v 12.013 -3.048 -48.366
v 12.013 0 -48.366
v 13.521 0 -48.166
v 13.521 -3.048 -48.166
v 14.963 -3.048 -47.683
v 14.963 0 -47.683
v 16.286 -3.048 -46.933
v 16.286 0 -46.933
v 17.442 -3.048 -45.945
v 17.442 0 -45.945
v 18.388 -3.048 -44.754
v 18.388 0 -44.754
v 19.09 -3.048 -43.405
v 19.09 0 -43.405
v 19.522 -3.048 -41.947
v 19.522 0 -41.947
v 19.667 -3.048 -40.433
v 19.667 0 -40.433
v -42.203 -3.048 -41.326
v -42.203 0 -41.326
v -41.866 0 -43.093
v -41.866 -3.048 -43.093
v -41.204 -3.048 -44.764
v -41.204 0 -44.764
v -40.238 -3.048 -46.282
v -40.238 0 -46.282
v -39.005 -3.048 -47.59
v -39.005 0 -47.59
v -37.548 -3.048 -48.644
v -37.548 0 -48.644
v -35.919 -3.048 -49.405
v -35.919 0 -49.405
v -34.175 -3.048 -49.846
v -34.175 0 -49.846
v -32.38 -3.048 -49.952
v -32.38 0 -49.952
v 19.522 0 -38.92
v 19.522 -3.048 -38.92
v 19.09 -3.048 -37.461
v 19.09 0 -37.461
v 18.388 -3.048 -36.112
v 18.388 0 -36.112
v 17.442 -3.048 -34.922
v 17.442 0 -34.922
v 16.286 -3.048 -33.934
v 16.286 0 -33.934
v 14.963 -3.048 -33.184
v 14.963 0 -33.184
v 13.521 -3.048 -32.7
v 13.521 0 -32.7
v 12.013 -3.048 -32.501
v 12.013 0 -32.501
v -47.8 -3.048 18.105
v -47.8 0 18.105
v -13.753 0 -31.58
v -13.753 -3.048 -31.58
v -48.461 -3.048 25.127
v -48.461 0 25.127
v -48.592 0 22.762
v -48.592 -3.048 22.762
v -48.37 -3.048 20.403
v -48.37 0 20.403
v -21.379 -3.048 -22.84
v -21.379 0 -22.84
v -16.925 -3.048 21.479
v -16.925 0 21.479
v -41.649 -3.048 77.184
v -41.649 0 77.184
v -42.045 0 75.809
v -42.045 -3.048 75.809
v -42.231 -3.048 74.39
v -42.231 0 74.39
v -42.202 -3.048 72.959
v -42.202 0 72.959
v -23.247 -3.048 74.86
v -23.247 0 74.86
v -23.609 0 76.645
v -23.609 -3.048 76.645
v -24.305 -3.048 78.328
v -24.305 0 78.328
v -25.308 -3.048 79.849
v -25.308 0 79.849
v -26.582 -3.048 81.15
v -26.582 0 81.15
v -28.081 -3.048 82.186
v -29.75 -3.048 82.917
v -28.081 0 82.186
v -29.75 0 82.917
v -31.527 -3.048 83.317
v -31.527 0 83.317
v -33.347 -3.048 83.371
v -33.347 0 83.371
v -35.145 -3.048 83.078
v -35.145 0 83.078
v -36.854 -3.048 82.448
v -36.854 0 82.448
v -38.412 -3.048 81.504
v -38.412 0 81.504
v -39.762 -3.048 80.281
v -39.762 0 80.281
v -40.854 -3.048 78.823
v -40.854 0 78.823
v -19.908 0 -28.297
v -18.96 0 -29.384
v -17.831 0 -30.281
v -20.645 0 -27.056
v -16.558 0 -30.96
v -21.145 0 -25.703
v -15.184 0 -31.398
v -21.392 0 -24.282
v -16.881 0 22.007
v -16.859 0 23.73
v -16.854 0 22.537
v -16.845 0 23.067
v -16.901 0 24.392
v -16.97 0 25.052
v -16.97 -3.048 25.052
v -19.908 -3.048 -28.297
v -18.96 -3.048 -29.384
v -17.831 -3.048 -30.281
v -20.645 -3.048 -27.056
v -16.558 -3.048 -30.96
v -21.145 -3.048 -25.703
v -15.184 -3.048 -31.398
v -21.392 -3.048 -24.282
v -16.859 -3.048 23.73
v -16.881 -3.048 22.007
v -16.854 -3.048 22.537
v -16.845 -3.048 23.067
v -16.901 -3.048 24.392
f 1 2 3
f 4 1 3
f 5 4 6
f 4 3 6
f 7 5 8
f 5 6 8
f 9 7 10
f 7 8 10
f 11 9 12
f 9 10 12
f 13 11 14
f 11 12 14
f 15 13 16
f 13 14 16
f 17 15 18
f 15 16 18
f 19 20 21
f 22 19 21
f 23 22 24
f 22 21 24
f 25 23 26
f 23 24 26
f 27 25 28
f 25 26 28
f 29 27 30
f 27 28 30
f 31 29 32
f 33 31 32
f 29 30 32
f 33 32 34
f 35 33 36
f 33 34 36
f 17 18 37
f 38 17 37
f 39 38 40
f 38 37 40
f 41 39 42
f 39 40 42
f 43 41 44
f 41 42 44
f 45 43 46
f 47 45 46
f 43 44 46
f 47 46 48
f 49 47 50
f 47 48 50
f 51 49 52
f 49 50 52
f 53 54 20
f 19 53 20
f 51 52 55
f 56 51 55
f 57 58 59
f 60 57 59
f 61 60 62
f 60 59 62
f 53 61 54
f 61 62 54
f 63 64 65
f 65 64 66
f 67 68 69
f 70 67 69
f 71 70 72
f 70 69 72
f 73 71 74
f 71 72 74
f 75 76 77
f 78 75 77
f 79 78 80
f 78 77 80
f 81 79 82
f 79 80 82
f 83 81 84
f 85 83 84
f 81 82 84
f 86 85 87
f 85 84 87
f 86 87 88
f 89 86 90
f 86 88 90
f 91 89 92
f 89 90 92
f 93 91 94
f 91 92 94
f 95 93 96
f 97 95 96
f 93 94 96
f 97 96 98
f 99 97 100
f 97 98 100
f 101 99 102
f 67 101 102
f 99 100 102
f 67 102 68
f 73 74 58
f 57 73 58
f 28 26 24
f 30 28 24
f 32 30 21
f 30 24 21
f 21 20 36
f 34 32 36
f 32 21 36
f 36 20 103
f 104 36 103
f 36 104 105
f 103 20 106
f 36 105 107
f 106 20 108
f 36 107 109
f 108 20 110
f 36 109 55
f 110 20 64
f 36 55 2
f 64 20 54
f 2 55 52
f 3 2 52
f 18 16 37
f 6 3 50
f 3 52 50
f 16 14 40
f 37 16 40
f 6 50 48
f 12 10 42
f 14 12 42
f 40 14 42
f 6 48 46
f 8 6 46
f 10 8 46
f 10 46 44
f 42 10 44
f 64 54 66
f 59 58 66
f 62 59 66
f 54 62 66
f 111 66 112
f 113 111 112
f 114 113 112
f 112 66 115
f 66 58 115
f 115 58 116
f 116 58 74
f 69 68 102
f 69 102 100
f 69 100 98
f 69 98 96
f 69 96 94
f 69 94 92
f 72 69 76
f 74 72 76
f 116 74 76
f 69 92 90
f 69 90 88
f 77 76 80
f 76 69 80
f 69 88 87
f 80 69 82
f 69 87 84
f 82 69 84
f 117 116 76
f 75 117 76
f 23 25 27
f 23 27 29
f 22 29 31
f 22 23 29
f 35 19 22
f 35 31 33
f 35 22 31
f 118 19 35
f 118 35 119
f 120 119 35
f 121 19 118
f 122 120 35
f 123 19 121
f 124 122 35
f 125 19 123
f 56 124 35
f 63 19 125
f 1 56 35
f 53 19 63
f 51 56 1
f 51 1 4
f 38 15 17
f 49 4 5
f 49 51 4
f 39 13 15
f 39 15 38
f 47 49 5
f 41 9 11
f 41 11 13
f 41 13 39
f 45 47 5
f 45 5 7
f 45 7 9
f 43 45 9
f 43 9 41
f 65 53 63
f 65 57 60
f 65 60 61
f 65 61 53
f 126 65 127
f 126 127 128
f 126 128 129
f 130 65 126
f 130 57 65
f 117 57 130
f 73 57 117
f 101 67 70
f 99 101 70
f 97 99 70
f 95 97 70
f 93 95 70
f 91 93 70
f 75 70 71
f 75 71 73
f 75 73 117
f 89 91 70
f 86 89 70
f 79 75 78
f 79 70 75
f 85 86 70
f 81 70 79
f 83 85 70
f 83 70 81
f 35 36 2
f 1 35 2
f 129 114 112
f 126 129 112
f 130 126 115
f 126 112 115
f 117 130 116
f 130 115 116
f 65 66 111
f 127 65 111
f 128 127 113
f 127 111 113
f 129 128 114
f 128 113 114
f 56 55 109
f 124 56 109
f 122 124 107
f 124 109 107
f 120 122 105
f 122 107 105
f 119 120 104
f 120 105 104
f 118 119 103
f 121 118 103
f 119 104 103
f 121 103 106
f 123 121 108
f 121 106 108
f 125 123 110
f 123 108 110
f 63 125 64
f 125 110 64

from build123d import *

# Parameters (mm, degrees)
F0_R     = 3.175
F1_DEPTH = 3.048


with BuildPart() as f1:
    # F0 (on Front) → F1 (new body)
    with BuildSketch(Plane.XZ):
        with BuildLine():
            ThreePointArc((-16.9247666998, 21.4792444312), (-22.070918521, 11.293529333), (-32.7201922638, 7.1917444312))
            Line((-32.7201922638, 7.1917444312), (-32.7201922638, -30.9082555688))
            ThreePointArc((-32.7201922638, -30.9082555688), (-25.985000173, -33.698063478), (-23.1951922638, -40.4332555688))
            Line((-23.1951922638, -40.4332555688), (3.7923077362, -40.4332555688))
            ThreePointArc((3.7923077362, -40.4332555688), (6.2182849547, -34.7212486641), (12.013289879, -32.5008193651))
            Line((12.013289879, -32.5008193651), (-13.7525922633, -31.5800218579))
            ThreePointArc((-13.7525922633, -31.5800218579), (-19.4589923665, -28.8618964189), (-21.3790056715, -22.8398737564))
            Line((-21.3790056715, -22.8398737564), (-16.9247666998, 21.4792444312))
        make_face()
        with BuildLine():
            ThreePointArc((-32.7201922638, 7.1917444312), (-42.0272444513, 10.2061688384), (-47.7997573919, 18.1046540905))
            Line((-47.7997573919, 18.1046540905), (-42.2032386499, -41.326259622))
            ThreePointArc((-42.2032386499, -41.326259622), (-39.7640366902, -34.0215568316), (-32.7201922638, -30.9082555688))
            Line((-32.7201922638, -30.9082555688), (-32.7201922638, 7.1917444312))
        make_face()
        with BuildLine():
            ThreePointArc((-23.1951922638, 73.8667444312), (-25.985000173, 67.1315523404), (-32.7201922638, 64.3417444312))
            Line((-32.7201922638, 64.3417444312), (-32.7201922638, 59.5919444312))
            Line((-32.7201922638, 59.5919444312), (-32.7201922638, 38.9417444312))
            ThreePointArc((-32.7201922638, 38.9417444312), (-22.2201134041, 34.9732119568), (-16.9697862216, 25.051772014))
            Line((-16.9697862216, 25.051772014), (-23.2470820733, 74.8596232349))
            ThreePointArc((-23.2470820733, 74.8596232349), (-23.2081735621, 74.3638613368), (-23.1951922638, 73.8667444312))
        make_face()
        with BuildLine():
            ThreePointArc((-16.9697862216, 25.051772014), (-22.2201134041, 34.9732119568), (-32.7201922638, 38.9417444312))
            Line((-32.7201922638, 38.9417444312), (-32.7201922638, 26.2417444312))
            ThreePointArc((-32.7201922638, 26.2417444312), (-30.4751282336, 25.3118084615), (-29.5451922638, 23.0667444312))
            ThreePointArc((-29.5451922638, 23.0667444312), (-30.4751282336, 20.821680401), (-32.7201922638, 19.8917444312))
            Line((-32.7201922638, 19.8917444312), (-32.7201922638, 7.1917444312))
            ThreePointArc((-32.7201922638, 7.1917444312), (-22.070918521, 11.293529333), (-16.9247666998, 21.4792444312))
            ThreePointArc((-16.9247666998, 21.4792444312), (-16.8650983532, 22.2719978772), (-16.8451922638, 23.0667444312))
            ThreePointArc((-16.8451922638, 23.0667444312), (-16.8763713718, 24.0612113938), (-16.9697862216, 25.051772014))
        make_face()
        with BuildLine():
            Line((-32.7201922638, 26.2417444312), (-32.7201922638, 38.9417444312))
            ThreePointArc((-32.7201922638, 38.9417444312), (-43.1919774337, 34.9981039664), (-48.4609965266, 25.1265274684))
            Line((-48.4609965266, 25.1265274684), (-47.7997573919, 18.1046540905))
            ThreePointArc((-47.7997573919, 18.1046540905), (-42.0272444513, 10.2061688384), (-32.7201922638, 7.1917444312))
            Line((-32.7201922638, 7.1917444312), (-32.7201922638, 19.8917444312))
            ThreePointArc((-32.7201922638, 19.8917444312), (-35.8951922638, 23.0667444312), (-32.7201922638, 26.2417444312))
        make_face()
        with BuildLine():
            Line((-32.7201922638, 59.5919444312), (-32.7201922638, 64.3417444312))
            ThreePointArc((-32.7201922638, 64.3417444312), (-39.1263785452, 66.8178862025), (-42.2018298248, 72.9589040472))
            Line((-42.2018298248, 72.9589040472), (-48.4609965266, 25.1265274684))
            ThreePointArc((-48.4609965266, 25.1265274684), (-43.1919774337, 34.9981039664), (-32.7201922638, 38.9417444312))
            Line((-32.7201922638, 38.9417444312), (-32.7201922638, 59.5919444312))
        make_face()
        with Locations((-35.8951922638, 59.5919444312)):
            Circle(F0_R, mode=Mode.SUBTRACT)
        with BuildLine():
            ThreePointArc((-42.2018298248, 72.9589040472), (-39.1263785452, 66.8178862025), (-32.7201922638, 64.3417444312))
            ThreePointArc((-32.7201922638, 64.3417444312), (-25.985000173, 67.1315523404), (-23.1951922638, 73.8667444312))
            ThreePointArc((-23.1951922638, 73.8667444312), (-23.2081735621, 74.3638613368), (-23.2470820733, 74.8596232349))
            ThreePointArc((-23.2470820733, 74.8596232349), (-31.5267060991, 83.3166764826), (-41.6489880278, 77.1837055714))
            Line((-41.6489880278, 77.1837055714), (-42.2018298248, 72.9589040472))
        make_face()
        with BuildLine():
            ThreePointArc((-29.5451922638, 73.8667444312), (-30.4751282336, 71.621680401), (-32.7201922638, 70.6917444312))
            ThreePointArc((-32.7201922638, 70.6917444312), (-34.9652562941, 76.1118084615), (-29.5451922638, 73.8667444312))
        make_face(mode=Mode.SUBTRACT)
        with BuildLine():
            ThreePointArc((-23.1951922638, -40.4332555688), (-25.8657839782, -47.0470829065), (-32.3800136924, -49.9521790131))
            Line((-32.3800136924, -49.9521790131), (12.013289879, -48.3656917724))
            ThreePointArc((12.013289879, -48.3656917724), (6.2182849547, -46.1452624735), (3.7923077362, -40.4332555688))
            Line((3.7923077362, -40.4332555688), (-23.1951922638, -40.4332555688))
        make_face()
        with BuildLine():
            ThreePointArc((3.7923077362, -40.4332555688), (6.2182849547, -46.1452624735), (12.013289879, -48.3656917724))
            ThreePointArc((12.013289879, -48.3656917724), (17.4418146409, -45.9447783502), (19.6673077362, -40.4332555688))
            ThreePointArc((19.6673077362, -40.4332555688), (17.4418146409, -34.9217327873), (12.013289879, -32.5008193651))
            ThreePointArc((12.013289879, -32.5008193651), (6.2182849547, -34.7212486641), (3.7923077362, -40.4332555688))
        make_face()
        with BuildLine():
            ThreePointArc((14.9048077362, -40.4332555688), (11.7298077362, -43.6082555688), (8.5548077362, -40.4332555688))
            ThreePointArc((8.5548077362, -40.4332555688), (11.7298077362, -37.2582555688), (14.9048077362, -40.4332555688))
        make_face(mode=Mode.SUBTRACT)
        with BuildLine():
            ThreePointArc((-32.7201922638, -30.9082555688), (-39.7640366902, -34.0215568316), (-42.2032386499, -41.326259622))
            ThreePointArc((-42.2032386499, -41.326259622), (-39.0050653178, -47.5904893707), (-32.3800136924, -49.9521790131))
            ThreePointArc((-32.3800136924, -49.9521790131), (-25.8657839782, -47.0470829065), (-23.1951922638, -40.4332555688))
            Line((-23.1951922638, -40.4332555688), (-29.5451922638, -40.4332555688))
            ThreePointArc((-29.5451922638, -40.4332555688), (-34.9652562941, -42.678319599), (-32.7201922638, -37.2582555688))
            Line((-32.7201922638, -37.2582555688), (-32.7201922638, -30.9082555688))
        make_face()
        with BuildLine():
            ThreePointArc((-23.1951922638, -40.4332555688), (-25.985000173, -33.698063478), (-32.7201922638, -30.9082555688))
            Line((-32.7201922638, -30.9082555688), (-32.7201922638, -37.2582555688))
            ThreePointArc((-32.7201922638, -37.2582555688), (-30.4751282336, -38.1881915385), (-29.5451922638, -40.4332555688))
            Line((-29.5451922638, -40.4332555688), (-23.1951922638, -40.4332555688))
        make_face()
        with Locations((-35.8951922638, 59.5919444312)):
            Circle(F0_R)
        with BuildLine():
            ThreePointArc((-29.5451922638, 73.8667444312), (-34.9652562941, 76.1118084615), (-32.7201922638, 70.6917444312))
            ThreePointArc((-32.7201922638, 70.6917444312), (-30.4751282336, 71.621680401), (-29.5451922638, 73.8667444312))
        make_face()
        with BuildLine():
            ThreePointArc((14.9048077362, -40.4332555688), (11.7298077362, -37.2582555688), (8.5548077362, -40.4332555688))
            ThreePointArc((8.5548077362, -40.4332555688), (11.7298077362, -43.6082555688), (14.9048077362, -40.4332555688))
        make_face()
        with BuildLine():
            Line((-32.7201922638, -40.4332555688), (-32.7201922638, -37.2582555688))
            ThreePointArc((-32.7201922638, -37.2582555688), (-34.9652562941, -42.678319599), (-29.5451922638, -40.4332555688))
            Line((-29.5451922638, -40.4332555688), (-32.7201922638, -40.4332555688))
        make_face()
        with BuildLine():
            ThreePointArc((-29.5451922638, 23.0667444312), (-30.4751282336, 25.3118084615), (-32.7201922638, 26.2417444312))
            Line((-32.7201922638, 26.2417444312), (-32.7201922638, 19.8917444312))
            ThreePointArc((-32.7201922638, 19.8917444312), (-30.4751282336, 20.821680401), (-29.5451922638, 23.0667444312))
        make_face()
        with BuildLine():
            Line((-32.7201922638, 19.8917444312), (-32.7201922638, 26.2417444312))
            ThreePointArc((-32.7201922638, 26.2417444312), (-35.8951922638, 23.0667444312), (-32.7201922638, 19.8917444312))
        make_face()
        with BuildLine():
            ThreePointArc((-29.5451922638, -40.4332555688), (-30.4751282336, -38.1881915385), (-32.7201922638, -37.2582555688))
            Line((-32.7201922638, -37.2582555688), (-32.7201922638, -40.4332555688))
            Line((-32.7201922638, -40.4332555688), (-29.5451922638, -40.4332555688))
        make_face()
        with BuildLine():
            Line((-47.7997573919, 18.1046540905), (-48.4609965266, 25.1265274684))
            ThreePointArc((-48.4609965266, 25.1265274684), (-48.525269574, 21.5784043426), (-47.7997573919, 18.1046540905))
        make_face()
        with BuildLine():
            ThreePointArc((-41.6489880278, 77.1837055714), (-42.1646748215, 75.1026142535), (-42.2018298248, 72.9589040472))
            Line((-42.2018298248, 72.9589040472), (-41.6489880278, 77.1837055714))
        make_face()
    extrude(amount=F1_DEPTH)


solid = f1.part
